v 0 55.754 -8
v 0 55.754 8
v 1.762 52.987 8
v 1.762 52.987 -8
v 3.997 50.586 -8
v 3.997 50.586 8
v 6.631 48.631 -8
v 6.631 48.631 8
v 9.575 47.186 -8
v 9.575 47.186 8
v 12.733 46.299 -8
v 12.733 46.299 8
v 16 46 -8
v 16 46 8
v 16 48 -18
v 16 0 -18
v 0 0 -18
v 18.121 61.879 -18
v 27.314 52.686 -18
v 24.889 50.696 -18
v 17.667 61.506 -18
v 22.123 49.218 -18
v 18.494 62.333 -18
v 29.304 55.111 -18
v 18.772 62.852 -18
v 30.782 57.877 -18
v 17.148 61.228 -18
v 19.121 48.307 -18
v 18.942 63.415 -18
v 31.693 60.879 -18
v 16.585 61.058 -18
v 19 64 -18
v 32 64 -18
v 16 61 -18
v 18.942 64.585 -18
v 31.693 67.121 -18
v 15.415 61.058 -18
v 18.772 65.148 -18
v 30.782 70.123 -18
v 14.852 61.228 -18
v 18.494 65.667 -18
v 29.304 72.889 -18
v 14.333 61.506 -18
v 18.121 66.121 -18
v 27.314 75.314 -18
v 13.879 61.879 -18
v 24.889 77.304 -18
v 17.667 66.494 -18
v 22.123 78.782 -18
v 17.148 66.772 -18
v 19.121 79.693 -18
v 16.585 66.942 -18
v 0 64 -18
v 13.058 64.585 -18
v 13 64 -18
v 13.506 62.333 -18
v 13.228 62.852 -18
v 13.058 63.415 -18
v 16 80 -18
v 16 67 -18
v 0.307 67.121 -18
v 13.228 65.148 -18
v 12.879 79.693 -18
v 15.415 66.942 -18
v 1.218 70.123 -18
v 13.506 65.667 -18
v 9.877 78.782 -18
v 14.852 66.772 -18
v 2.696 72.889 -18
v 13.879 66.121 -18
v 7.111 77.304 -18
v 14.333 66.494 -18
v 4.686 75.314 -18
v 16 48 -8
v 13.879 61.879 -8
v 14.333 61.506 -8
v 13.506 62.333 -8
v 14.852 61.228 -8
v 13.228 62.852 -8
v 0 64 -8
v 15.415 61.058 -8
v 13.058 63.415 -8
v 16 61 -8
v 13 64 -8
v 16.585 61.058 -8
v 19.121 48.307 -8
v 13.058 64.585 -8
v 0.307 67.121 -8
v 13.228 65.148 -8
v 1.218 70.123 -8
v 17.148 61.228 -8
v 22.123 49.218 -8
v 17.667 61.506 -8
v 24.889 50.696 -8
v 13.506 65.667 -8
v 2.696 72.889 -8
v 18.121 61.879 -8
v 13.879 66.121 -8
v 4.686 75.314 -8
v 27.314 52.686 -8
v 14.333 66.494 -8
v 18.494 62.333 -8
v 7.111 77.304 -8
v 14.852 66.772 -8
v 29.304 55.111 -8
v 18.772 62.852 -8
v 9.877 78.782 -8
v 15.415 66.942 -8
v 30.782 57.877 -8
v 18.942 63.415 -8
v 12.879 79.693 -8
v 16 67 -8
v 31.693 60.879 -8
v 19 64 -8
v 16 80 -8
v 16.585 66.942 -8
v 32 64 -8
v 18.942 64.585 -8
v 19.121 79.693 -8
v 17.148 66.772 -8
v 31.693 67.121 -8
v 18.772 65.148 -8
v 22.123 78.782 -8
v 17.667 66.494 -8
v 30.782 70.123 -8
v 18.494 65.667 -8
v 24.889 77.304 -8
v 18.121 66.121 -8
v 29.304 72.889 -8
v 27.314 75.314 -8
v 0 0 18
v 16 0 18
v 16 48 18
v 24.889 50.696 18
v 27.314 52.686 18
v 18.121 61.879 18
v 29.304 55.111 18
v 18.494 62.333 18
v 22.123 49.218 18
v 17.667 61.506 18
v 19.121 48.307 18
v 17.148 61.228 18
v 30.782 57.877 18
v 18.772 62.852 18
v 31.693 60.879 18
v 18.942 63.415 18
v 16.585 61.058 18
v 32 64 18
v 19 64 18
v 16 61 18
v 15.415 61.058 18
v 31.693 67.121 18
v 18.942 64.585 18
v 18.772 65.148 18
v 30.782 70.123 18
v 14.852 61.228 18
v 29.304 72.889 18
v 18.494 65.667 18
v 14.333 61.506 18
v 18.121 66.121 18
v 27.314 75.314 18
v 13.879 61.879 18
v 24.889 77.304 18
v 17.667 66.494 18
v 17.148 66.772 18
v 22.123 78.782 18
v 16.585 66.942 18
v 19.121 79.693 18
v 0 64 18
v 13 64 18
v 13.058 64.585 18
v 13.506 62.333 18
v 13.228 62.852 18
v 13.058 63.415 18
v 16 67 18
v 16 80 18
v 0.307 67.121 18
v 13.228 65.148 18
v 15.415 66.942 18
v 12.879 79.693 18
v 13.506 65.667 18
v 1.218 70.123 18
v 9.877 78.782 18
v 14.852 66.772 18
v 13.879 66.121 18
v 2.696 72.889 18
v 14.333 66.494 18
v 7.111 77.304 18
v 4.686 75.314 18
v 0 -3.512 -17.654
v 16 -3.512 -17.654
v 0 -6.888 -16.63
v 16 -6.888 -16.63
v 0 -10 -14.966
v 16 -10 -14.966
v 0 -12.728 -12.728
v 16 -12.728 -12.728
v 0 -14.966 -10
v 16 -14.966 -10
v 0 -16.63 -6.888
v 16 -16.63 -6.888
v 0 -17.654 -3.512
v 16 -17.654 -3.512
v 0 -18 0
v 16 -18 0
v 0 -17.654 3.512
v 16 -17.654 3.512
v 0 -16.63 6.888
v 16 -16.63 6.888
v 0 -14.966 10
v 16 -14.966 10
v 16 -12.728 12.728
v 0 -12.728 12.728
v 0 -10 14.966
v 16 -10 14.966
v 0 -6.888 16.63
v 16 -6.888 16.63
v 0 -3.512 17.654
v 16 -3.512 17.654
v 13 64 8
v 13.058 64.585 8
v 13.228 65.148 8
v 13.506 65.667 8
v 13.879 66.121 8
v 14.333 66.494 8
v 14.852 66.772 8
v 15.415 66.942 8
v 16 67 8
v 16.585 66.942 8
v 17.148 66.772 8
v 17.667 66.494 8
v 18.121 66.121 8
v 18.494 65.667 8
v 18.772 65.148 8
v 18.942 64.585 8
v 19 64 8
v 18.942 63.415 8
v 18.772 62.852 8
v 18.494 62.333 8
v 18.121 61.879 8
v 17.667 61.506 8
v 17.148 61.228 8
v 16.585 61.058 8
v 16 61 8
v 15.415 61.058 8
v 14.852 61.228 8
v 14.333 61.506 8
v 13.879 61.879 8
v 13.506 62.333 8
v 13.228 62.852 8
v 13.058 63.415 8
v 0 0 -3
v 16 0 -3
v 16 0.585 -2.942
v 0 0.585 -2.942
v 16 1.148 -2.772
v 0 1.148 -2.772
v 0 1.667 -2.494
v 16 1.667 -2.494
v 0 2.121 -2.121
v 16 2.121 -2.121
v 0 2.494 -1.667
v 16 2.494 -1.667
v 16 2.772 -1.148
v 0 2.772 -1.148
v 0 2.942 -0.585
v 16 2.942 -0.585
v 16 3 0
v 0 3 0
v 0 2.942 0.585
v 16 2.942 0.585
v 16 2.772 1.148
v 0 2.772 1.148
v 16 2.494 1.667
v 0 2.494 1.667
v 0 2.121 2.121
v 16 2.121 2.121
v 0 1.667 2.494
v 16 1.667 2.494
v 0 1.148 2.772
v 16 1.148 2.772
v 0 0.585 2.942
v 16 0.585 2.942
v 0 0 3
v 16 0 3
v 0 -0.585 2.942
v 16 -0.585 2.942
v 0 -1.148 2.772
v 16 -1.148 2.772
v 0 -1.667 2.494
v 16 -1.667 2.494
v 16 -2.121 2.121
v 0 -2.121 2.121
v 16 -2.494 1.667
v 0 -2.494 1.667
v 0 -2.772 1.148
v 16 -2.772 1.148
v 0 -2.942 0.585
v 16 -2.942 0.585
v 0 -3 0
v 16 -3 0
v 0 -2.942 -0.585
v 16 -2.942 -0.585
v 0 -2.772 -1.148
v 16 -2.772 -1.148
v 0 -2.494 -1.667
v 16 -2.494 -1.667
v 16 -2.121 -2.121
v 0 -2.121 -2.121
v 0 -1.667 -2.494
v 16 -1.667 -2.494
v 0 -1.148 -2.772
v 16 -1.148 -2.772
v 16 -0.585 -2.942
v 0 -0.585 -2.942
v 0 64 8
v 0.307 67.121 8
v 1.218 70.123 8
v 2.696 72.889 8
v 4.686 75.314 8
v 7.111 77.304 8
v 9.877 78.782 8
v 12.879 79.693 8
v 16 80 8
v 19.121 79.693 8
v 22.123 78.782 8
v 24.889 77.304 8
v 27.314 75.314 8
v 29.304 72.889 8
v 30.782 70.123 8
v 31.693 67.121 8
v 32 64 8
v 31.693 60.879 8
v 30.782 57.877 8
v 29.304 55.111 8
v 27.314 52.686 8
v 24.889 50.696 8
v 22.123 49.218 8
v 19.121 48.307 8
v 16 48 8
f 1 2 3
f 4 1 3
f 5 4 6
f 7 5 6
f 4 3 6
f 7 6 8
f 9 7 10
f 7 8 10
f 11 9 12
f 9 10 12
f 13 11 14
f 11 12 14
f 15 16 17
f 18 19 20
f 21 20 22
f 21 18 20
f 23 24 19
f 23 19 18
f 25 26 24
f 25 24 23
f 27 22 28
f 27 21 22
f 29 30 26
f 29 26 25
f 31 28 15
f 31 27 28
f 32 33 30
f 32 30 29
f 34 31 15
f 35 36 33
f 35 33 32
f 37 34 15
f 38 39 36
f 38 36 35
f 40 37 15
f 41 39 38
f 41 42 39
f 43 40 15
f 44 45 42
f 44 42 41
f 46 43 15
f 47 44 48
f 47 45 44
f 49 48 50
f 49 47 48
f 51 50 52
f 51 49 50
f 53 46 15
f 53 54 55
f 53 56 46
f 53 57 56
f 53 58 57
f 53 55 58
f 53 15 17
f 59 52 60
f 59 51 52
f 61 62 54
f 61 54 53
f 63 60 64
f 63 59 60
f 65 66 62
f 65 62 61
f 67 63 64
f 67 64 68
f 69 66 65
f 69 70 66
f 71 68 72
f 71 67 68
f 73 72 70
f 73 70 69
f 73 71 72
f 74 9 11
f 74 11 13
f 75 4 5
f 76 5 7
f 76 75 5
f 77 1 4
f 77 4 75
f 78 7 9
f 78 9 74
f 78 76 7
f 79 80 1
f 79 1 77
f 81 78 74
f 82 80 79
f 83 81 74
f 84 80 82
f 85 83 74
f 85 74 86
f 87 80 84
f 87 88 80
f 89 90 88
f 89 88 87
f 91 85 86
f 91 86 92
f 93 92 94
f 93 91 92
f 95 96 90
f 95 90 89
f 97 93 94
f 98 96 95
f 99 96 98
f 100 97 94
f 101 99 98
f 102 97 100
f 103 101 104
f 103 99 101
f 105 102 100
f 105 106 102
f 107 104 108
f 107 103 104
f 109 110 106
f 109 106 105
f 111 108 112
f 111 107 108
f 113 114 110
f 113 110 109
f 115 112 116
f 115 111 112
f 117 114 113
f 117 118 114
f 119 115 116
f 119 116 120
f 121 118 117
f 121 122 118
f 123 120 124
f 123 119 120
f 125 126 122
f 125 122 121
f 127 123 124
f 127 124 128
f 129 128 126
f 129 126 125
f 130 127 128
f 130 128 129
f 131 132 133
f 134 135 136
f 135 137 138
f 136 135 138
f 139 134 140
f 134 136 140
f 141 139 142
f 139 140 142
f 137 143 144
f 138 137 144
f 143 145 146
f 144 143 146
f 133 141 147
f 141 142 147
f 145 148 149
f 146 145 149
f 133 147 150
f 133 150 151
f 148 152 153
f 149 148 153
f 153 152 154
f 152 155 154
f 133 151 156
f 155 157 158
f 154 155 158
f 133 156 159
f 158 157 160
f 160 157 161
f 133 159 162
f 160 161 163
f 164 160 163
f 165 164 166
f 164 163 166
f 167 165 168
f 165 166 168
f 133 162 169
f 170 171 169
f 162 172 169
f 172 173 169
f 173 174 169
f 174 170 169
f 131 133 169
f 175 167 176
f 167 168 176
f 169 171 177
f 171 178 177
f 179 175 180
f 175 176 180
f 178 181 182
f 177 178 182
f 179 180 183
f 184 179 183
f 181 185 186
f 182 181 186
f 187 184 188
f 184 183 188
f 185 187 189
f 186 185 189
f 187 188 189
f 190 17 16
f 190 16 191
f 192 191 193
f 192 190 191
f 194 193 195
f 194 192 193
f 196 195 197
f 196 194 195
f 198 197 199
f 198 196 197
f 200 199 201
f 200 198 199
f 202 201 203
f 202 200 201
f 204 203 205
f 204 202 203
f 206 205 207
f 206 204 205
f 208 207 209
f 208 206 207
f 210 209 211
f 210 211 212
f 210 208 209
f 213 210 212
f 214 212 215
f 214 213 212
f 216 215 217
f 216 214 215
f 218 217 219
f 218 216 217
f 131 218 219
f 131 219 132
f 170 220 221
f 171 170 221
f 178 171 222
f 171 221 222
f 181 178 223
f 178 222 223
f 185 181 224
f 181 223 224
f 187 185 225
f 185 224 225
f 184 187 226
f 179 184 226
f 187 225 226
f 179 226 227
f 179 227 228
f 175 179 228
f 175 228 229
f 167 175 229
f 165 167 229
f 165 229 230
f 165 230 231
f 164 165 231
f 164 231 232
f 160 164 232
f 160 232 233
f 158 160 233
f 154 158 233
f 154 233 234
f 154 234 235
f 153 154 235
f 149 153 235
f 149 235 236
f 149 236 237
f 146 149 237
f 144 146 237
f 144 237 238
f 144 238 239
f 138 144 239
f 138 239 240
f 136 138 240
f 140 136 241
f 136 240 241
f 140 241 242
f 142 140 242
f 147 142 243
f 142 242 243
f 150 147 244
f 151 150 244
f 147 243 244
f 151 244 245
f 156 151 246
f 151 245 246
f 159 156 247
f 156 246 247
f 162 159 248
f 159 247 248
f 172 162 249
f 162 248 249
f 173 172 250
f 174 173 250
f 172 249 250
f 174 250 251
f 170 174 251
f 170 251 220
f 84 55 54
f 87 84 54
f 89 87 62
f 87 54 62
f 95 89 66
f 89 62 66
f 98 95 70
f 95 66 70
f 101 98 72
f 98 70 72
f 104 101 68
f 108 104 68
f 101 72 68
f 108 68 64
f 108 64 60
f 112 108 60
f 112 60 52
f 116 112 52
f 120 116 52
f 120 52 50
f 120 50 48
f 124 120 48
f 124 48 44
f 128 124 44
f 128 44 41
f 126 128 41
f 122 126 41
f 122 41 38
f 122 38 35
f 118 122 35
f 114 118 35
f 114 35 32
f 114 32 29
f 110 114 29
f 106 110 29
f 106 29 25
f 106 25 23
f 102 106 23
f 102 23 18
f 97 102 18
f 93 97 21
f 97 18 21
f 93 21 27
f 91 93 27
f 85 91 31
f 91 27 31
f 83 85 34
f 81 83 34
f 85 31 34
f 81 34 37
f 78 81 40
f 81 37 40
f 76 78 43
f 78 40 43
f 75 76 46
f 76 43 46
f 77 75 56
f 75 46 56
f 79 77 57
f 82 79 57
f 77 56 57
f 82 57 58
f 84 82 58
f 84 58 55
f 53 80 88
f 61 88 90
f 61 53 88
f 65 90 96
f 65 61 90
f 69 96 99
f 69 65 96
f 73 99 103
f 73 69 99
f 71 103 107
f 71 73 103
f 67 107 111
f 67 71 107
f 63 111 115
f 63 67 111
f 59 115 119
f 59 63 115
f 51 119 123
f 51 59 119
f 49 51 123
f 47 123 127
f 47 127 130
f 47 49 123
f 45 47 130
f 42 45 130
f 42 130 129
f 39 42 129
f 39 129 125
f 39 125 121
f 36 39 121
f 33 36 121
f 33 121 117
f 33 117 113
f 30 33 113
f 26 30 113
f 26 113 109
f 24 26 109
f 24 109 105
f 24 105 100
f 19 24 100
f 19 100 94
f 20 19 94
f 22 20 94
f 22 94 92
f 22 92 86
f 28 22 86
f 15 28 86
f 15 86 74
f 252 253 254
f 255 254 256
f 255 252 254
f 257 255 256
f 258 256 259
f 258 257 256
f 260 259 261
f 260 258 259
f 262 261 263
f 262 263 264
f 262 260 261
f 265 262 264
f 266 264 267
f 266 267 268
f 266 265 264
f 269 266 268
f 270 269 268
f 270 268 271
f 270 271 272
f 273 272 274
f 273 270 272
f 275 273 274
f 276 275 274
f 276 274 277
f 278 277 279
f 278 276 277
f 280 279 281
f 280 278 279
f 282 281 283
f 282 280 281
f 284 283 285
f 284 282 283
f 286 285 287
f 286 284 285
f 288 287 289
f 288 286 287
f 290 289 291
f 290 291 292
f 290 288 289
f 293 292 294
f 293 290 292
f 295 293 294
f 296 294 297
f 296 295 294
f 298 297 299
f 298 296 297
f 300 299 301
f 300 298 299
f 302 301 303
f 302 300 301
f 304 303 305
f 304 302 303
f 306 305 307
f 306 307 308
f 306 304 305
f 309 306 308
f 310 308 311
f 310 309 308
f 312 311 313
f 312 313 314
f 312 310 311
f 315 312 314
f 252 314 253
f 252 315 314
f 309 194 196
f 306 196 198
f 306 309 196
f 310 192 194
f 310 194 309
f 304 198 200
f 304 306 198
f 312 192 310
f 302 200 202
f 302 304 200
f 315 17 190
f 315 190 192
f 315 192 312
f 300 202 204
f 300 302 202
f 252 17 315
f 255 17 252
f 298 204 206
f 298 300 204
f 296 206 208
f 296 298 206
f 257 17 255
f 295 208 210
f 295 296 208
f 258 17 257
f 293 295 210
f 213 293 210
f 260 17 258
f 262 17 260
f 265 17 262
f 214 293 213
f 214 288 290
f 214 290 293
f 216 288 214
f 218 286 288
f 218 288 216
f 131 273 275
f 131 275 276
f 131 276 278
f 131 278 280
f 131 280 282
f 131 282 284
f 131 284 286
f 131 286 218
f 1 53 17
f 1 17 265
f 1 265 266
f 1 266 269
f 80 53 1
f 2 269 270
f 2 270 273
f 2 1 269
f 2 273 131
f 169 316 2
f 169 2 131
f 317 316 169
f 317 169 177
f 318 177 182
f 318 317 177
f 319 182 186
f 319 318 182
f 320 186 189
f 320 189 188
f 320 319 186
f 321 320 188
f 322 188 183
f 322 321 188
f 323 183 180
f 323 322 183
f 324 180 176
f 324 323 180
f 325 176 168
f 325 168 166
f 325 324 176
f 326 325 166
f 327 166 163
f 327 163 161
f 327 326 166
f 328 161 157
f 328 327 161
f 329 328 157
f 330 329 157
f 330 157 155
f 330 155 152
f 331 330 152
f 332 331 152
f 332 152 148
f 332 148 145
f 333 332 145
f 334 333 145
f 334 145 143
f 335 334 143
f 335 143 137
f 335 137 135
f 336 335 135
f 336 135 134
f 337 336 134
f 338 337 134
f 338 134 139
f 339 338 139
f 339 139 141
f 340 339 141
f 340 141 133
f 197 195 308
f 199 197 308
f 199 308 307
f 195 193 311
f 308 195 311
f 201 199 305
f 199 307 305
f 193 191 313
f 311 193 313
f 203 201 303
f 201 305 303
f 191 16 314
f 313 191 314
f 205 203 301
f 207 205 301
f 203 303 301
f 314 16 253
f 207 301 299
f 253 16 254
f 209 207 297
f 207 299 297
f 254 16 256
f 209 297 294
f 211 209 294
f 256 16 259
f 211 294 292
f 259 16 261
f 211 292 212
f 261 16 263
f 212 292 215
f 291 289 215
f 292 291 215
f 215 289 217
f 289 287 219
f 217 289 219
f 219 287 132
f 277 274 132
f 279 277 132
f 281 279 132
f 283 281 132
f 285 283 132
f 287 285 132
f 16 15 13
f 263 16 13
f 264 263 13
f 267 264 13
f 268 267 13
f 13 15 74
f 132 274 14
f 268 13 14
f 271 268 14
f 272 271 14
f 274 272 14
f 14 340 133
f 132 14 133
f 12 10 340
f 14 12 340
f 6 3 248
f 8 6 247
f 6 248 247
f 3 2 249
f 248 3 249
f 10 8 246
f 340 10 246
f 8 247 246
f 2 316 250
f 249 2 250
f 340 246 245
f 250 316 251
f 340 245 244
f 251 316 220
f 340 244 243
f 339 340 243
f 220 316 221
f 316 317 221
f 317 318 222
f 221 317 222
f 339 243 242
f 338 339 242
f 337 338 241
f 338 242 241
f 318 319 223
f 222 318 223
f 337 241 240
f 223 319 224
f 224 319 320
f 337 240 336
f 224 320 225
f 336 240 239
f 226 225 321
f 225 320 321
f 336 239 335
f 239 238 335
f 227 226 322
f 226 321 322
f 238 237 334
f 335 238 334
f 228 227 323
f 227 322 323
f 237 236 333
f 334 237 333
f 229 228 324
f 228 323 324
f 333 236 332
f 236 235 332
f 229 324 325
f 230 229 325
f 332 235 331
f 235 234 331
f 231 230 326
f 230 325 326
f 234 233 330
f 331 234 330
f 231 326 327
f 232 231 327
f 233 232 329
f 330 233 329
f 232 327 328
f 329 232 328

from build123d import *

# Parameters (mm, degrees)
SKETCH_1_R          = 3
EXTRUDE_1_DEPTH     = 16
SKETCH_3_W          = 16
SKETCH_3_H          = 32
EXTRUDE_2_DEPTH     = 36
SKETCH_5_R          = 3
CUT_EXTRUDE_1_DEPTH = 36
SKETCH_8_R          = 18
CUT_EXTRUDE_6_DEPTH = 8


with BuildPart() as part:
    # 草图1 → 凸台-拉伸1 (new body)
    with BuildSketch(Plane(origin=(0, 0, 0), x_dir=(0, 0, -1), z_dir=(1, 0, 0))):
        with BuildLine():
            Line((-18, 0), (-18, 80))
            Line((-18, 80), (18, 80))
            Line((18, 80), (18, 0))
            ThreePointArc((18, 0), (0, -18), (-18, 0))
        make_face()
        Circle(SKETCH_1_R, mode=Mode.SUBTRACT)
    extrude(amount=EXTRUDE_1_DEPTH)

    # 草图3 → 凸台-拉伸2 (add)
    with BuildSketch(Plane(origin=(0, 0, -18), x_dir=(-1, 0, 0), z_dir=(0, 0, -1))):
        with Locations((-24, 64)):
            Rectangle(SKETCH_3_W, SKETCH_3_H)
    extrude(amount=-EXTRUDE_2_DEPTH)

    # 草图5 → 切除-拉伸1 (cut)
    with BuildSketch(Plane(origin=(0, 0, -18), x_dir=(-1, 0, 0), z_dir=(0, 0, -1))):
        with Locations((-16, 64)):
            Circle(SKETCH_5_R)
        with BuildLine():
            Line((-16, 92.996070946), (8.992787367, 92.996070946))
            Line((8.992787367, 92.996070946), (8.992787367, 64))
            Line((8.992787367, 64), (0, 64))
            ThreePointArc((0, 64), (-27.313708499, 75.313708499), (-16, 48))
            Line((-16, 48), (-16, 39.001100245))
            Line((-16, 39.001100245), (-49.117406919, 39.001100245))
            Line((-49.117406919, 39.001100245), (-49.117406919, 92.996070946))
            Line((-49.117406919, 92.996070946), (-16, 92.996070946))
        make_face()
    extrude(amount=-CUT_EXTRUDE_1_DEPTH, mode=Mode.SUBTRACT)

    # 草图8 → 切除-拉伸6 (cut, symmetric)
    with BuildSketch(Plane.XY):
        with Locations((16, 64)):
            Circle(SKETCH_8_R)
    extrude(amount=CUT_EXTRUDE_6_DEPTH, both=True, mode=Mode.SUBTRACT)


solid = part.part
